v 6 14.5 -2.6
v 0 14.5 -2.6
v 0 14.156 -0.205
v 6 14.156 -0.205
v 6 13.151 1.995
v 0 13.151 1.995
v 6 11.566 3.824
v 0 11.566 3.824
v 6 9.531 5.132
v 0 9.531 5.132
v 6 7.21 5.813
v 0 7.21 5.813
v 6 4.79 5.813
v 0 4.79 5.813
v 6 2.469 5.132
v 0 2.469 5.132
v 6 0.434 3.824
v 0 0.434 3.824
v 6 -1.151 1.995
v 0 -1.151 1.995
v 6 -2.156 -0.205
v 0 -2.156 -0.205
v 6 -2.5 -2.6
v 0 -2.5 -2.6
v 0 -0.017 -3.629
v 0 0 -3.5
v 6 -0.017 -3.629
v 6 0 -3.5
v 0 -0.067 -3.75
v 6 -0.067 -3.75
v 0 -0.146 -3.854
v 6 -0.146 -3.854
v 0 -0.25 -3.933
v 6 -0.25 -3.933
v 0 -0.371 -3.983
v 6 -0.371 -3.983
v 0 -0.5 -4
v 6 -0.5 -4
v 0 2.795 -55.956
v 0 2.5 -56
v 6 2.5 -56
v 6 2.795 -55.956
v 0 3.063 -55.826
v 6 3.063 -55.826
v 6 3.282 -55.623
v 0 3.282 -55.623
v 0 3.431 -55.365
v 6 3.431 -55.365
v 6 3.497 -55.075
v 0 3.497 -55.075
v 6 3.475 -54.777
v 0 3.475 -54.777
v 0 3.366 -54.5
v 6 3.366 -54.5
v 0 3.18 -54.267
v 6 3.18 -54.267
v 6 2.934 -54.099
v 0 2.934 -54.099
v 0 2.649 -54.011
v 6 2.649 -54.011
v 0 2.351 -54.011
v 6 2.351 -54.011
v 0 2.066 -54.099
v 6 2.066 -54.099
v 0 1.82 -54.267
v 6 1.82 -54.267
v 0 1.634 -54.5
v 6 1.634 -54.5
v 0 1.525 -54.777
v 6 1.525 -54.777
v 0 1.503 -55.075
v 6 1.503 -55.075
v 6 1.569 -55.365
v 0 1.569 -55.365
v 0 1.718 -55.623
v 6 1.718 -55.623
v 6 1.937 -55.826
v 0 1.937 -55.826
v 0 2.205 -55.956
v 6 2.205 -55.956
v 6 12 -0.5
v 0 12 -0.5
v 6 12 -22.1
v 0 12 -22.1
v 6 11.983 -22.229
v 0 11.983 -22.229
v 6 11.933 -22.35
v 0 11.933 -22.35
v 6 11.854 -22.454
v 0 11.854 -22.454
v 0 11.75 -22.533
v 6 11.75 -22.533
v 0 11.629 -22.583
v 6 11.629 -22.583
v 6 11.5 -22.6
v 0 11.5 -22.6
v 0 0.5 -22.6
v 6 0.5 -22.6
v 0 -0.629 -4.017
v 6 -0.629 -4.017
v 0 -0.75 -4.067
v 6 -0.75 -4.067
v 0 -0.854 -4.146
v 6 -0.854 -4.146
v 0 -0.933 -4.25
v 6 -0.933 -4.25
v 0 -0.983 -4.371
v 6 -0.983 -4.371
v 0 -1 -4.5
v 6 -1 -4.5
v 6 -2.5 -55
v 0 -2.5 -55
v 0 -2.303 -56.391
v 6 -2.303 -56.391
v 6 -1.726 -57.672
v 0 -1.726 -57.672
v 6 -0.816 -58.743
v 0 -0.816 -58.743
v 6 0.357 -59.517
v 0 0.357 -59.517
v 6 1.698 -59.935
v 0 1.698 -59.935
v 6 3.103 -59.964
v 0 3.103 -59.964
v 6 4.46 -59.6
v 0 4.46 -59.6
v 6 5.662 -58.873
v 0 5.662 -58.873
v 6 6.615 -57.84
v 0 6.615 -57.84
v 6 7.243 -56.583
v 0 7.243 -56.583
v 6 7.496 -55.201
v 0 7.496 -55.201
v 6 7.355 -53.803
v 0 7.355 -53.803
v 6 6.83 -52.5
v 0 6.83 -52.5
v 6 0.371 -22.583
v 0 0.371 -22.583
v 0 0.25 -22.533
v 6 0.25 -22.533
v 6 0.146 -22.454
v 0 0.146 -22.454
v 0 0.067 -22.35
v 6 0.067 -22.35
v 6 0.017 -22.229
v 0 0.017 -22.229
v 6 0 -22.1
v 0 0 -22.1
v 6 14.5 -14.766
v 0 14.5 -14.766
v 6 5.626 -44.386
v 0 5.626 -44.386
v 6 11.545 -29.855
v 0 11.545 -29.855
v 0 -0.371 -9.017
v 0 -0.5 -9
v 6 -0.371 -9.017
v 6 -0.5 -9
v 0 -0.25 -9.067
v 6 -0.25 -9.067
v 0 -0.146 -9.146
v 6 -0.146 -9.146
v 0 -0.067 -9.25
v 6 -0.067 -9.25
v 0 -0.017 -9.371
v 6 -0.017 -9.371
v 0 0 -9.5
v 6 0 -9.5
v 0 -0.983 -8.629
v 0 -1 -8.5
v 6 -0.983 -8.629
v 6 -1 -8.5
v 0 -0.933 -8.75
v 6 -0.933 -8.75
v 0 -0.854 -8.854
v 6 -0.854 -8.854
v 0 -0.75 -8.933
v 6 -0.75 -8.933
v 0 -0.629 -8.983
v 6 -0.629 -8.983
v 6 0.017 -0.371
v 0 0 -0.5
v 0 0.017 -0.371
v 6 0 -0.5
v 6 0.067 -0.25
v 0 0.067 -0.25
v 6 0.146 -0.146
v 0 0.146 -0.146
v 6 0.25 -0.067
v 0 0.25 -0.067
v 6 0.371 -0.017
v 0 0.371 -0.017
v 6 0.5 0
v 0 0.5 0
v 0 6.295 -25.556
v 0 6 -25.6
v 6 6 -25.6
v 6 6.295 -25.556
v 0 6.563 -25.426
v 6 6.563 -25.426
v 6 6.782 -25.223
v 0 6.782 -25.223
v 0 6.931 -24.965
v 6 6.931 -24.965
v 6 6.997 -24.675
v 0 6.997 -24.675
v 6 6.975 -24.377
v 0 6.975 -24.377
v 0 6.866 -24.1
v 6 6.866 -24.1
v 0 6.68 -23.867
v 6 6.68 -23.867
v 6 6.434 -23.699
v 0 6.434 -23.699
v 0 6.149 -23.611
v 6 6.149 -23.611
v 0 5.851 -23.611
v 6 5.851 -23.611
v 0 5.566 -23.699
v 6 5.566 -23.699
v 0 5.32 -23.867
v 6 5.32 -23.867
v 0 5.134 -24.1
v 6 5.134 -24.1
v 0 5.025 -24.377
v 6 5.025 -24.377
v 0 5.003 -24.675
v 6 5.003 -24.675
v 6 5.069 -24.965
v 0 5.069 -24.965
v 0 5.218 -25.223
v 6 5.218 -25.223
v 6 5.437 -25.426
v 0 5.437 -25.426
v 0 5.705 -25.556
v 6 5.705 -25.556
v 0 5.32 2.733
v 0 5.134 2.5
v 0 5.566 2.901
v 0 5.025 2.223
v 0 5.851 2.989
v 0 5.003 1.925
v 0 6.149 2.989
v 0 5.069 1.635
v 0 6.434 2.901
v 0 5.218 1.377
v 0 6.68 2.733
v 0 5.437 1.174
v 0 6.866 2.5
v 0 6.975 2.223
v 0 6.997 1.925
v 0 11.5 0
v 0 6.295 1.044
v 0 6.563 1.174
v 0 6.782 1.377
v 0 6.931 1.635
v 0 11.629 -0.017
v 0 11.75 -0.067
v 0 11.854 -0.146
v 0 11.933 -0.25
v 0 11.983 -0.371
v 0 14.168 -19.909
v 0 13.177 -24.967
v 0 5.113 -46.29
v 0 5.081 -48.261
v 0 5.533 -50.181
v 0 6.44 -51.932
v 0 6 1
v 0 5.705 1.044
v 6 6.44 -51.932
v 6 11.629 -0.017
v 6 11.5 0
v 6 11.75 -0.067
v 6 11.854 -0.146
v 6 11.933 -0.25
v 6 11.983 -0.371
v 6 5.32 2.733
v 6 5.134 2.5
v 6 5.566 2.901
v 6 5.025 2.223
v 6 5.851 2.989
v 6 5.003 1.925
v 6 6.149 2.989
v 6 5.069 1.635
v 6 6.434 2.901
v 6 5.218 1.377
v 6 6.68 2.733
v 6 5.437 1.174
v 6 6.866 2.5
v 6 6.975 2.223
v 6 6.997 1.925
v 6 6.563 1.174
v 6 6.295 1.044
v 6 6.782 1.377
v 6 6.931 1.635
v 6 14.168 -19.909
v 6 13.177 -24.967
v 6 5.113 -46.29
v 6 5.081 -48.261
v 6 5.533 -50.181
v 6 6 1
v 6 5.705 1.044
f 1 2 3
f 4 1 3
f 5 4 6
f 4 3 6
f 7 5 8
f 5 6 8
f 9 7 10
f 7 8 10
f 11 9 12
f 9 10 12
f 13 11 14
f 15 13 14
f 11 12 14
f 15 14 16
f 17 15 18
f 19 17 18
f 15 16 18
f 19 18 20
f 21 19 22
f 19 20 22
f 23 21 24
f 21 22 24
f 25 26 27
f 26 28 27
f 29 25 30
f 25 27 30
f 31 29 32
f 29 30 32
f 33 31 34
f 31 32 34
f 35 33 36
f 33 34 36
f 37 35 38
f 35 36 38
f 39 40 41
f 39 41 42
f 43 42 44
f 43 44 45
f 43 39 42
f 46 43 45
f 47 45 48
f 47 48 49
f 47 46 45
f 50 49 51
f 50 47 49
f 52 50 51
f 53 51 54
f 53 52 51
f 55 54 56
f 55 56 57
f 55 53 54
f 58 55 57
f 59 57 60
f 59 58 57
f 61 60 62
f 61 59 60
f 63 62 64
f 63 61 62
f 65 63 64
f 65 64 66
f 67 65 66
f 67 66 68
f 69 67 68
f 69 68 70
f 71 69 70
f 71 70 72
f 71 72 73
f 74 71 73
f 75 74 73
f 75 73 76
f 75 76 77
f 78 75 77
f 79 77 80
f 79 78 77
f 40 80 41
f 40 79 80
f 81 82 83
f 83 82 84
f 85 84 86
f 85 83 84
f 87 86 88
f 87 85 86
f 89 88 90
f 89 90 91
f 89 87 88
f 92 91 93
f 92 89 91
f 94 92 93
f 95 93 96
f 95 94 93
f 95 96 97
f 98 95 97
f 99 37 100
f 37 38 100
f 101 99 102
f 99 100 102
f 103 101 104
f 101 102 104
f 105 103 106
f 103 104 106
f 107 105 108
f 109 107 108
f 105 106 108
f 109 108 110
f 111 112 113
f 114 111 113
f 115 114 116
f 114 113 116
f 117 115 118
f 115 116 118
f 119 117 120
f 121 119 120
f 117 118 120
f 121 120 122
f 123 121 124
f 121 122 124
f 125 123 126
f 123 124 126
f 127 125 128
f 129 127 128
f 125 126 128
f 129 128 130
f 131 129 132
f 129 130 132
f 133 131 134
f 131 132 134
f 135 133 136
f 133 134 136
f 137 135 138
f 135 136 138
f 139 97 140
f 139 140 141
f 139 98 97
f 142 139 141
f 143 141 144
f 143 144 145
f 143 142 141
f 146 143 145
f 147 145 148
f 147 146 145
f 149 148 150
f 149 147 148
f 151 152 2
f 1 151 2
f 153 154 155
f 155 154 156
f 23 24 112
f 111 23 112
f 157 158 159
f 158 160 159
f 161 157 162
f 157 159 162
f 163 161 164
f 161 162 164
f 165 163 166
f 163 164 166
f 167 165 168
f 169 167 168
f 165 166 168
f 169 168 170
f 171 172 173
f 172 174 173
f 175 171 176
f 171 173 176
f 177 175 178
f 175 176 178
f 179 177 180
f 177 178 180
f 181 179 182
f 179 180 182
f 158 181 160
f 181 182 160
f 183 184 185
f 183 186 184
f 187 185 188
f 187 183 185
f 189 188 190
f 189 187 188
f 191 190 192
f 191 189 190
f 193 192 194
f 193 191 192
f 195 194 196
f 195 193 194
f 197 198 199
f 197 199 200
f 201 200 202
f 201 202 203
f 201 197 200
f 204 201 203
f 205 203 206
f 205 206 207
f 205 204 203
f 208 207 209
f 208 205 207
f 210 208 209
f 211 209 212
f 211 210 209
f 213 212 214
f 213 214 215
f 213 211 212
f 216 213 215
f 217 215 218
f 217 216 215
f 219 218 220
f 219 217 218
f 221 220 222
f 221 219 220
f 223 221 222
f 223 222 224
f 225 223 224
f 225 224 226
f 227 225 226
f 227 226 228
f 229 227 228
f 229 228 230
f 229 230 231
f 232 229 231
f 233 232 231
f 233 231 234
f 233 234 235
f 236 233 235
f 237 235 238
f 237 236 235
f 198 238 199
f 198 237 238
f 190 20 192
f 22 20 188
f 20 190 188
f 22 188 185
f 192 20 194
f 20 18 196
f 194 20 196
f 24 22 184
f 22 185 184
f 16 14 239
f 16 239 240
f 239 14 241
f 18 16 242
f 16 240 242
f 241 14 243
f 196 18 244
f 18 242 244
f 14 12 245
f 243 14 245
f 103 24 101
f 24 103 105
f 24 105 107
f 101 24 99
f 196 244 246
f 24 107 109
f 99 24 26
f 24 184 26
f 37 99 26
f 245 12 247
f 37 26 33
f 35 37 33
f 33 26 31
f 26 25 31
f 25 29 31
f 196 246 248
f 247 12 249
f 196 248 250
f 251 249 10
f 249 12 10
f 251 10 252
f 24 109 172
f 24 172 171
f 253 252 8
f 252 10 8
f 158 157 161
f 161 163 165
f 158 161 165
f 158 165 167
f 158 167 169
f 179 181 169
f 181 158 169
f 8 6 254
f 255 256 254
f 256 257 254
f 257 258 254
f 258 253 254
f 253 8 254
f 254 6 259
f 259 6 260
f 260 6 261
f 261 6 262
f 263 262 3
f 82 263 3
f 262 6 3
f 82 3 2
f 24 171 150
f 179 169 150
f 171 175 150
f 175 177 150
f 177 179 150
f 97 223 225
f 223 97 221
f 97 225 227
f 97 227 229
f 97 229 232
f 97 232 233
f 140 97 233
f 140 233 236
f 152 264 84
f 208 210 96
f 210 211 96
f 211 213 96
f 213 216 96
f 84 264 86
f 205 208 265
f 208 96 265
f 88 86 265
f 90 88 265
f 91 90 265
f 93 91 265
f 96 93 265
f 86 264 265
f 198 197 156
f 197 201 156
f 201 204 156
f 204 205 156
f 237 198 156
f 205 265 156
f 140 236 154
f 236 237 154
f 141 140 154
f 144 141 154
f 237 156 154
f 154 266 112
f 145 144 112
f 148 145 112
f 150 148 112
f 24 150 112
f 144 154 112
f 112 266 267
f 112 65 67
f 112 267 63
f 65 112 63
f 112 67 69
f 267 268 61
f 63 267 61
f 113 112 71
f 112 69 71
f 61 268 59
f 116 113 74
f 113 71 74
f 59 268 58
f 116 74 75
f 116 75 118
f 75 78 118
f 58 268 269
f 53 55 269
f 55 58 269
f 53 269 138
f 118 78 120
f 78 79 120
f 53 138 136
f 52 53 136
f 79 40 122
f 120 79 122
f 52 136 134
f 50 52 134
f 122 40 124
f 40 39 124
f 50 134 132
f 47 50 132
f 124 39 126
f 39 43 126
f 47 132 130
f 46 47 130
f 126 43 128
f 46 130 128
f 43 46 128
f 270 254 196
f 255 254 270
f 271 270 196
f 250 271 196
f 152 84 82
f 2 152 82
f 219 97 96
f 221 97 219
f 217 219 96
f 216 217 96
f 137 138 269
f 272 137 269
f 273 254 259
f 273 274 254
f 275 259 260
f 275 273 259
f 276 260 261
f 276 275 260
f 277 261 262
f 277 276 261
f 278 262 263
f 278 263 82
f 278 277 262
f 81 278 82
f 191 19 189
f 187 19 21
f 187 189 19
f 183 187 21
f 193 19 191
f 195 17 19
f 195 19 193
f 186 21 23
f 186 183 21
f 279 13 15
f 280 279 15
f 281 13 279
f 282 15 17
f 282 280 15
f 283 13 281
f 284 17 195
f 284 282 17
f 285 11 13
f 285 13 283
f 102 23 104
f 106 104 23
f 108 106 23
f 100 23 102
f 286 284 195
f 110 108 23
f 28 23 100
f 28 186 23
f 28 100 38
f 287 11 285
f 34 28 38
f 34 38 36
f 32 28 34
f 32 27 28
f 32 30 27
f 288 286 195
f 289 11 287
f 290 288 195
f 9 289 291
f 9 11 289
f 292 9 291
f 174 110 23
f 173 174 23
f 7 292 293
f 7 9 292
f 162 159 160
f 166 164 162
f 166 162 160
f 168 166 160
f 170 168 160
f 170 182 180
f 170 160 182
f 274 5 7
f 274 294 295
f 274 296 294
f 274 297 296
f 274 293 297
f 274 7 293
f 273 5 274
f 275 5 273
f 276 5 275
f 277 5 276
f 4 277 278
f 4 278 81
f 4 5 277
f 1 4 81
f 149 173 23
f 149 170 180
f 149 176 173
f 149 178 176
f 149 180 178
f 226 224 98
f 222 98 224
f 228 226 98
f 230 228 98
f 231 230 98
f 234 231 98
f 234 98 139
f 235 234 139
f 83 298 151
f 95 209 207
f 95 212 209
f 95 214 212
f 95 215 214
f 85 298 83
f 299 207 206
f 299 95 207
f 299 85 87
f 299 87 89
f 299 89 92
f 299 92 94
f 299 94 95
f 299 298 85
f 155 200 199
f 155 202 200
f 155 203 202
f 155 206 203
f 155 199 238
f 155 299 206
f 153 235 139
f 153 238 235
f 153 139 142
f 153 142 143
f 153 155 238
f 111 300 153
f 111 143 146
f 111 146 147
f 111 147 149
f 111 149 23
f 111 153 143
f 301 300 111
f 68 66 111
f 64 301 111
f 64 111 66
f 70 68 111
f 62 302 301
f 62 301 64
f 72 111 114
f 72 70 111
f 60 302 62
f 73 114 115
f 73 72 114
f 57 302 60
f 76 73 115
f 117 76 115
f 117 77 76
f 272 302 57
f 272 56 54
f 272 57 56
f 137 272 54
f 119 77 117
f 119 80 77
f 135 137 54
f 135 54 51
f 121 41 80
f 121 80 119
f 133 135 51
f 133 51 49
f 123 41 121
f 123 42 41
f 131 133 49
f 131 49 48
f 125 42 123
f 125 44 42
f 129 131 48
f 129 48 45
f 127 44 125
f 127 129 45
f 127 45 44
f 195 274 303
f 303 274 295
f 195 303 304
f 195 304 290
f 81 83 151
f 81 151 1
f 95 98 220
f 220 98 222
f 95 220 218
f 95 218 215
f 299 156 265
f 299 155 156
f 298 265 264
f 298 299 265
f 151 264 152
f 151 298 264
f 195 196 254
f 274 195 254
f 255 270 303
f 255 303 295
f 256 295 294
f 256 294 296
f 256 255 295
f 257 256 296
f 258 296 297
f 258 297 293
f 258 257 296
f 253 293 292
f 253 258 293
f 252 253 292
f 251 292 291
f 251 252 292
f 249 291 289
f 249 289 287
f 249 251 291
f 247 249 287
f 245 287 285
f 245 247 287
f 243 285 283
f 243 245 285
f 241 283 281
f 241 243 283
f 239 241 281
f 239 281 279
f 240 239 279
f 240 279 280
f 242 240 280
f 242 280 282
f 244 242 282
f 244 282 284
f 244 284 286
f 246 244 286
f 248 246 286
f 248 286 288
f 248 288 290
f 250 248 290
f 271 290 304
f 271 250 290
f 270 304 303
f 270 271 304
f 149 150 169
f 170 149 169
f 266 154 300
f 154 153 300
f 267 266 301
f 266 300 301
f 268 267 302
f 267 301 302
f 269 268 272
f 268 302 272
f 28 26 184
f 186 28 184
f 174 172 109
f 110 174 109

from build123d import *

# Parameters (mm, degrees)
SCHIZZO1_R                   = 1
ESTRUSIONE_ESTRUSIONE1_DEPTH = 6
RACCORDO1_R                  = 8
RACCORDO2_R                  = 40
RACCORDO3_R                  = 0.5


with BuildPart() as part:
    # Schizzo1 → Estrusione-Estrusione1 (new body)
    with BuildSketch(Plane(origin=(0, 0, 0), x_dir=(0, 0, -1), z_dir=(1, 0, 0))):
        with BuildLine():
            Line((22.6, 14.5), (2.6, 14.5))
            ThreePointArc((2.6, 14.5), (-5.9, 6), (2.6, -2.5))
            Line((2.6, -2.5), (55, -2.5))
            ThreePointArc((55, -2.5), (59.829629131, 3.794095226), (52.5, 6.830127019))
            Line((52.5, 6.830127019), (48.378061008, 4))
            Line((48.378061008, 4), (22.6, 14.5))
        make_face()
        Polygon((0, 0), (0, 12), (22.6, 12), (22.6, 0), (9, 0), (9, -1), (4, -1), (4, 0), align=None, mode=Mode.SUBTRACT)
        with Locations((-2, 6)):
            Circle(SCHIZZO1_R, mode=Mode.SUBTRACT)
        with Locations((24.6, 6)):
            Circle(SCHIZZO1_R, mode=Mode.SUBTRACT)
        with Locations((55, 2.5)):
            Circle(SCHIZZO1_R, mode=Mode.SUBTRACT)
    extrude(amount=ESTRUSIONE_ESTRUSIONE1_DEPTH)

    # Raccordo1
    raccordo1_edges = [part.edges().sort_by_distance(p)[0] for p in [
        (3, 4, -48.378061008),
    ]]
    fillet(raccordo1_edges, radius=RACCORDO1_R)

    # Raccordo2
    raccordo2_edges = [part.edges().sort_by_distance(p)[0] for p in [
        (3, 14.5, -22.6),
    ]]
    fillet(raccordo2_edges, radius=RACCORDO2_R)

    # Raccordo3
    raccordo3_edges = [part.edges().sort_by_distance(p)[0] for p in [
        (3, 0, -22.6),
        (3, 0, 0),
        (3, 12, 0),
        (3, 12, -22.6),
        (3, 0, -4),
        (3, -1, -4),
        (3, -1, -9),
        (3, 0, -9),
    ]]
    fillet(raccordo3_edges, radius=RACCORDO3_R - 0.0001)  # a hair under: the kernel refuses the full size


solid = part.part
